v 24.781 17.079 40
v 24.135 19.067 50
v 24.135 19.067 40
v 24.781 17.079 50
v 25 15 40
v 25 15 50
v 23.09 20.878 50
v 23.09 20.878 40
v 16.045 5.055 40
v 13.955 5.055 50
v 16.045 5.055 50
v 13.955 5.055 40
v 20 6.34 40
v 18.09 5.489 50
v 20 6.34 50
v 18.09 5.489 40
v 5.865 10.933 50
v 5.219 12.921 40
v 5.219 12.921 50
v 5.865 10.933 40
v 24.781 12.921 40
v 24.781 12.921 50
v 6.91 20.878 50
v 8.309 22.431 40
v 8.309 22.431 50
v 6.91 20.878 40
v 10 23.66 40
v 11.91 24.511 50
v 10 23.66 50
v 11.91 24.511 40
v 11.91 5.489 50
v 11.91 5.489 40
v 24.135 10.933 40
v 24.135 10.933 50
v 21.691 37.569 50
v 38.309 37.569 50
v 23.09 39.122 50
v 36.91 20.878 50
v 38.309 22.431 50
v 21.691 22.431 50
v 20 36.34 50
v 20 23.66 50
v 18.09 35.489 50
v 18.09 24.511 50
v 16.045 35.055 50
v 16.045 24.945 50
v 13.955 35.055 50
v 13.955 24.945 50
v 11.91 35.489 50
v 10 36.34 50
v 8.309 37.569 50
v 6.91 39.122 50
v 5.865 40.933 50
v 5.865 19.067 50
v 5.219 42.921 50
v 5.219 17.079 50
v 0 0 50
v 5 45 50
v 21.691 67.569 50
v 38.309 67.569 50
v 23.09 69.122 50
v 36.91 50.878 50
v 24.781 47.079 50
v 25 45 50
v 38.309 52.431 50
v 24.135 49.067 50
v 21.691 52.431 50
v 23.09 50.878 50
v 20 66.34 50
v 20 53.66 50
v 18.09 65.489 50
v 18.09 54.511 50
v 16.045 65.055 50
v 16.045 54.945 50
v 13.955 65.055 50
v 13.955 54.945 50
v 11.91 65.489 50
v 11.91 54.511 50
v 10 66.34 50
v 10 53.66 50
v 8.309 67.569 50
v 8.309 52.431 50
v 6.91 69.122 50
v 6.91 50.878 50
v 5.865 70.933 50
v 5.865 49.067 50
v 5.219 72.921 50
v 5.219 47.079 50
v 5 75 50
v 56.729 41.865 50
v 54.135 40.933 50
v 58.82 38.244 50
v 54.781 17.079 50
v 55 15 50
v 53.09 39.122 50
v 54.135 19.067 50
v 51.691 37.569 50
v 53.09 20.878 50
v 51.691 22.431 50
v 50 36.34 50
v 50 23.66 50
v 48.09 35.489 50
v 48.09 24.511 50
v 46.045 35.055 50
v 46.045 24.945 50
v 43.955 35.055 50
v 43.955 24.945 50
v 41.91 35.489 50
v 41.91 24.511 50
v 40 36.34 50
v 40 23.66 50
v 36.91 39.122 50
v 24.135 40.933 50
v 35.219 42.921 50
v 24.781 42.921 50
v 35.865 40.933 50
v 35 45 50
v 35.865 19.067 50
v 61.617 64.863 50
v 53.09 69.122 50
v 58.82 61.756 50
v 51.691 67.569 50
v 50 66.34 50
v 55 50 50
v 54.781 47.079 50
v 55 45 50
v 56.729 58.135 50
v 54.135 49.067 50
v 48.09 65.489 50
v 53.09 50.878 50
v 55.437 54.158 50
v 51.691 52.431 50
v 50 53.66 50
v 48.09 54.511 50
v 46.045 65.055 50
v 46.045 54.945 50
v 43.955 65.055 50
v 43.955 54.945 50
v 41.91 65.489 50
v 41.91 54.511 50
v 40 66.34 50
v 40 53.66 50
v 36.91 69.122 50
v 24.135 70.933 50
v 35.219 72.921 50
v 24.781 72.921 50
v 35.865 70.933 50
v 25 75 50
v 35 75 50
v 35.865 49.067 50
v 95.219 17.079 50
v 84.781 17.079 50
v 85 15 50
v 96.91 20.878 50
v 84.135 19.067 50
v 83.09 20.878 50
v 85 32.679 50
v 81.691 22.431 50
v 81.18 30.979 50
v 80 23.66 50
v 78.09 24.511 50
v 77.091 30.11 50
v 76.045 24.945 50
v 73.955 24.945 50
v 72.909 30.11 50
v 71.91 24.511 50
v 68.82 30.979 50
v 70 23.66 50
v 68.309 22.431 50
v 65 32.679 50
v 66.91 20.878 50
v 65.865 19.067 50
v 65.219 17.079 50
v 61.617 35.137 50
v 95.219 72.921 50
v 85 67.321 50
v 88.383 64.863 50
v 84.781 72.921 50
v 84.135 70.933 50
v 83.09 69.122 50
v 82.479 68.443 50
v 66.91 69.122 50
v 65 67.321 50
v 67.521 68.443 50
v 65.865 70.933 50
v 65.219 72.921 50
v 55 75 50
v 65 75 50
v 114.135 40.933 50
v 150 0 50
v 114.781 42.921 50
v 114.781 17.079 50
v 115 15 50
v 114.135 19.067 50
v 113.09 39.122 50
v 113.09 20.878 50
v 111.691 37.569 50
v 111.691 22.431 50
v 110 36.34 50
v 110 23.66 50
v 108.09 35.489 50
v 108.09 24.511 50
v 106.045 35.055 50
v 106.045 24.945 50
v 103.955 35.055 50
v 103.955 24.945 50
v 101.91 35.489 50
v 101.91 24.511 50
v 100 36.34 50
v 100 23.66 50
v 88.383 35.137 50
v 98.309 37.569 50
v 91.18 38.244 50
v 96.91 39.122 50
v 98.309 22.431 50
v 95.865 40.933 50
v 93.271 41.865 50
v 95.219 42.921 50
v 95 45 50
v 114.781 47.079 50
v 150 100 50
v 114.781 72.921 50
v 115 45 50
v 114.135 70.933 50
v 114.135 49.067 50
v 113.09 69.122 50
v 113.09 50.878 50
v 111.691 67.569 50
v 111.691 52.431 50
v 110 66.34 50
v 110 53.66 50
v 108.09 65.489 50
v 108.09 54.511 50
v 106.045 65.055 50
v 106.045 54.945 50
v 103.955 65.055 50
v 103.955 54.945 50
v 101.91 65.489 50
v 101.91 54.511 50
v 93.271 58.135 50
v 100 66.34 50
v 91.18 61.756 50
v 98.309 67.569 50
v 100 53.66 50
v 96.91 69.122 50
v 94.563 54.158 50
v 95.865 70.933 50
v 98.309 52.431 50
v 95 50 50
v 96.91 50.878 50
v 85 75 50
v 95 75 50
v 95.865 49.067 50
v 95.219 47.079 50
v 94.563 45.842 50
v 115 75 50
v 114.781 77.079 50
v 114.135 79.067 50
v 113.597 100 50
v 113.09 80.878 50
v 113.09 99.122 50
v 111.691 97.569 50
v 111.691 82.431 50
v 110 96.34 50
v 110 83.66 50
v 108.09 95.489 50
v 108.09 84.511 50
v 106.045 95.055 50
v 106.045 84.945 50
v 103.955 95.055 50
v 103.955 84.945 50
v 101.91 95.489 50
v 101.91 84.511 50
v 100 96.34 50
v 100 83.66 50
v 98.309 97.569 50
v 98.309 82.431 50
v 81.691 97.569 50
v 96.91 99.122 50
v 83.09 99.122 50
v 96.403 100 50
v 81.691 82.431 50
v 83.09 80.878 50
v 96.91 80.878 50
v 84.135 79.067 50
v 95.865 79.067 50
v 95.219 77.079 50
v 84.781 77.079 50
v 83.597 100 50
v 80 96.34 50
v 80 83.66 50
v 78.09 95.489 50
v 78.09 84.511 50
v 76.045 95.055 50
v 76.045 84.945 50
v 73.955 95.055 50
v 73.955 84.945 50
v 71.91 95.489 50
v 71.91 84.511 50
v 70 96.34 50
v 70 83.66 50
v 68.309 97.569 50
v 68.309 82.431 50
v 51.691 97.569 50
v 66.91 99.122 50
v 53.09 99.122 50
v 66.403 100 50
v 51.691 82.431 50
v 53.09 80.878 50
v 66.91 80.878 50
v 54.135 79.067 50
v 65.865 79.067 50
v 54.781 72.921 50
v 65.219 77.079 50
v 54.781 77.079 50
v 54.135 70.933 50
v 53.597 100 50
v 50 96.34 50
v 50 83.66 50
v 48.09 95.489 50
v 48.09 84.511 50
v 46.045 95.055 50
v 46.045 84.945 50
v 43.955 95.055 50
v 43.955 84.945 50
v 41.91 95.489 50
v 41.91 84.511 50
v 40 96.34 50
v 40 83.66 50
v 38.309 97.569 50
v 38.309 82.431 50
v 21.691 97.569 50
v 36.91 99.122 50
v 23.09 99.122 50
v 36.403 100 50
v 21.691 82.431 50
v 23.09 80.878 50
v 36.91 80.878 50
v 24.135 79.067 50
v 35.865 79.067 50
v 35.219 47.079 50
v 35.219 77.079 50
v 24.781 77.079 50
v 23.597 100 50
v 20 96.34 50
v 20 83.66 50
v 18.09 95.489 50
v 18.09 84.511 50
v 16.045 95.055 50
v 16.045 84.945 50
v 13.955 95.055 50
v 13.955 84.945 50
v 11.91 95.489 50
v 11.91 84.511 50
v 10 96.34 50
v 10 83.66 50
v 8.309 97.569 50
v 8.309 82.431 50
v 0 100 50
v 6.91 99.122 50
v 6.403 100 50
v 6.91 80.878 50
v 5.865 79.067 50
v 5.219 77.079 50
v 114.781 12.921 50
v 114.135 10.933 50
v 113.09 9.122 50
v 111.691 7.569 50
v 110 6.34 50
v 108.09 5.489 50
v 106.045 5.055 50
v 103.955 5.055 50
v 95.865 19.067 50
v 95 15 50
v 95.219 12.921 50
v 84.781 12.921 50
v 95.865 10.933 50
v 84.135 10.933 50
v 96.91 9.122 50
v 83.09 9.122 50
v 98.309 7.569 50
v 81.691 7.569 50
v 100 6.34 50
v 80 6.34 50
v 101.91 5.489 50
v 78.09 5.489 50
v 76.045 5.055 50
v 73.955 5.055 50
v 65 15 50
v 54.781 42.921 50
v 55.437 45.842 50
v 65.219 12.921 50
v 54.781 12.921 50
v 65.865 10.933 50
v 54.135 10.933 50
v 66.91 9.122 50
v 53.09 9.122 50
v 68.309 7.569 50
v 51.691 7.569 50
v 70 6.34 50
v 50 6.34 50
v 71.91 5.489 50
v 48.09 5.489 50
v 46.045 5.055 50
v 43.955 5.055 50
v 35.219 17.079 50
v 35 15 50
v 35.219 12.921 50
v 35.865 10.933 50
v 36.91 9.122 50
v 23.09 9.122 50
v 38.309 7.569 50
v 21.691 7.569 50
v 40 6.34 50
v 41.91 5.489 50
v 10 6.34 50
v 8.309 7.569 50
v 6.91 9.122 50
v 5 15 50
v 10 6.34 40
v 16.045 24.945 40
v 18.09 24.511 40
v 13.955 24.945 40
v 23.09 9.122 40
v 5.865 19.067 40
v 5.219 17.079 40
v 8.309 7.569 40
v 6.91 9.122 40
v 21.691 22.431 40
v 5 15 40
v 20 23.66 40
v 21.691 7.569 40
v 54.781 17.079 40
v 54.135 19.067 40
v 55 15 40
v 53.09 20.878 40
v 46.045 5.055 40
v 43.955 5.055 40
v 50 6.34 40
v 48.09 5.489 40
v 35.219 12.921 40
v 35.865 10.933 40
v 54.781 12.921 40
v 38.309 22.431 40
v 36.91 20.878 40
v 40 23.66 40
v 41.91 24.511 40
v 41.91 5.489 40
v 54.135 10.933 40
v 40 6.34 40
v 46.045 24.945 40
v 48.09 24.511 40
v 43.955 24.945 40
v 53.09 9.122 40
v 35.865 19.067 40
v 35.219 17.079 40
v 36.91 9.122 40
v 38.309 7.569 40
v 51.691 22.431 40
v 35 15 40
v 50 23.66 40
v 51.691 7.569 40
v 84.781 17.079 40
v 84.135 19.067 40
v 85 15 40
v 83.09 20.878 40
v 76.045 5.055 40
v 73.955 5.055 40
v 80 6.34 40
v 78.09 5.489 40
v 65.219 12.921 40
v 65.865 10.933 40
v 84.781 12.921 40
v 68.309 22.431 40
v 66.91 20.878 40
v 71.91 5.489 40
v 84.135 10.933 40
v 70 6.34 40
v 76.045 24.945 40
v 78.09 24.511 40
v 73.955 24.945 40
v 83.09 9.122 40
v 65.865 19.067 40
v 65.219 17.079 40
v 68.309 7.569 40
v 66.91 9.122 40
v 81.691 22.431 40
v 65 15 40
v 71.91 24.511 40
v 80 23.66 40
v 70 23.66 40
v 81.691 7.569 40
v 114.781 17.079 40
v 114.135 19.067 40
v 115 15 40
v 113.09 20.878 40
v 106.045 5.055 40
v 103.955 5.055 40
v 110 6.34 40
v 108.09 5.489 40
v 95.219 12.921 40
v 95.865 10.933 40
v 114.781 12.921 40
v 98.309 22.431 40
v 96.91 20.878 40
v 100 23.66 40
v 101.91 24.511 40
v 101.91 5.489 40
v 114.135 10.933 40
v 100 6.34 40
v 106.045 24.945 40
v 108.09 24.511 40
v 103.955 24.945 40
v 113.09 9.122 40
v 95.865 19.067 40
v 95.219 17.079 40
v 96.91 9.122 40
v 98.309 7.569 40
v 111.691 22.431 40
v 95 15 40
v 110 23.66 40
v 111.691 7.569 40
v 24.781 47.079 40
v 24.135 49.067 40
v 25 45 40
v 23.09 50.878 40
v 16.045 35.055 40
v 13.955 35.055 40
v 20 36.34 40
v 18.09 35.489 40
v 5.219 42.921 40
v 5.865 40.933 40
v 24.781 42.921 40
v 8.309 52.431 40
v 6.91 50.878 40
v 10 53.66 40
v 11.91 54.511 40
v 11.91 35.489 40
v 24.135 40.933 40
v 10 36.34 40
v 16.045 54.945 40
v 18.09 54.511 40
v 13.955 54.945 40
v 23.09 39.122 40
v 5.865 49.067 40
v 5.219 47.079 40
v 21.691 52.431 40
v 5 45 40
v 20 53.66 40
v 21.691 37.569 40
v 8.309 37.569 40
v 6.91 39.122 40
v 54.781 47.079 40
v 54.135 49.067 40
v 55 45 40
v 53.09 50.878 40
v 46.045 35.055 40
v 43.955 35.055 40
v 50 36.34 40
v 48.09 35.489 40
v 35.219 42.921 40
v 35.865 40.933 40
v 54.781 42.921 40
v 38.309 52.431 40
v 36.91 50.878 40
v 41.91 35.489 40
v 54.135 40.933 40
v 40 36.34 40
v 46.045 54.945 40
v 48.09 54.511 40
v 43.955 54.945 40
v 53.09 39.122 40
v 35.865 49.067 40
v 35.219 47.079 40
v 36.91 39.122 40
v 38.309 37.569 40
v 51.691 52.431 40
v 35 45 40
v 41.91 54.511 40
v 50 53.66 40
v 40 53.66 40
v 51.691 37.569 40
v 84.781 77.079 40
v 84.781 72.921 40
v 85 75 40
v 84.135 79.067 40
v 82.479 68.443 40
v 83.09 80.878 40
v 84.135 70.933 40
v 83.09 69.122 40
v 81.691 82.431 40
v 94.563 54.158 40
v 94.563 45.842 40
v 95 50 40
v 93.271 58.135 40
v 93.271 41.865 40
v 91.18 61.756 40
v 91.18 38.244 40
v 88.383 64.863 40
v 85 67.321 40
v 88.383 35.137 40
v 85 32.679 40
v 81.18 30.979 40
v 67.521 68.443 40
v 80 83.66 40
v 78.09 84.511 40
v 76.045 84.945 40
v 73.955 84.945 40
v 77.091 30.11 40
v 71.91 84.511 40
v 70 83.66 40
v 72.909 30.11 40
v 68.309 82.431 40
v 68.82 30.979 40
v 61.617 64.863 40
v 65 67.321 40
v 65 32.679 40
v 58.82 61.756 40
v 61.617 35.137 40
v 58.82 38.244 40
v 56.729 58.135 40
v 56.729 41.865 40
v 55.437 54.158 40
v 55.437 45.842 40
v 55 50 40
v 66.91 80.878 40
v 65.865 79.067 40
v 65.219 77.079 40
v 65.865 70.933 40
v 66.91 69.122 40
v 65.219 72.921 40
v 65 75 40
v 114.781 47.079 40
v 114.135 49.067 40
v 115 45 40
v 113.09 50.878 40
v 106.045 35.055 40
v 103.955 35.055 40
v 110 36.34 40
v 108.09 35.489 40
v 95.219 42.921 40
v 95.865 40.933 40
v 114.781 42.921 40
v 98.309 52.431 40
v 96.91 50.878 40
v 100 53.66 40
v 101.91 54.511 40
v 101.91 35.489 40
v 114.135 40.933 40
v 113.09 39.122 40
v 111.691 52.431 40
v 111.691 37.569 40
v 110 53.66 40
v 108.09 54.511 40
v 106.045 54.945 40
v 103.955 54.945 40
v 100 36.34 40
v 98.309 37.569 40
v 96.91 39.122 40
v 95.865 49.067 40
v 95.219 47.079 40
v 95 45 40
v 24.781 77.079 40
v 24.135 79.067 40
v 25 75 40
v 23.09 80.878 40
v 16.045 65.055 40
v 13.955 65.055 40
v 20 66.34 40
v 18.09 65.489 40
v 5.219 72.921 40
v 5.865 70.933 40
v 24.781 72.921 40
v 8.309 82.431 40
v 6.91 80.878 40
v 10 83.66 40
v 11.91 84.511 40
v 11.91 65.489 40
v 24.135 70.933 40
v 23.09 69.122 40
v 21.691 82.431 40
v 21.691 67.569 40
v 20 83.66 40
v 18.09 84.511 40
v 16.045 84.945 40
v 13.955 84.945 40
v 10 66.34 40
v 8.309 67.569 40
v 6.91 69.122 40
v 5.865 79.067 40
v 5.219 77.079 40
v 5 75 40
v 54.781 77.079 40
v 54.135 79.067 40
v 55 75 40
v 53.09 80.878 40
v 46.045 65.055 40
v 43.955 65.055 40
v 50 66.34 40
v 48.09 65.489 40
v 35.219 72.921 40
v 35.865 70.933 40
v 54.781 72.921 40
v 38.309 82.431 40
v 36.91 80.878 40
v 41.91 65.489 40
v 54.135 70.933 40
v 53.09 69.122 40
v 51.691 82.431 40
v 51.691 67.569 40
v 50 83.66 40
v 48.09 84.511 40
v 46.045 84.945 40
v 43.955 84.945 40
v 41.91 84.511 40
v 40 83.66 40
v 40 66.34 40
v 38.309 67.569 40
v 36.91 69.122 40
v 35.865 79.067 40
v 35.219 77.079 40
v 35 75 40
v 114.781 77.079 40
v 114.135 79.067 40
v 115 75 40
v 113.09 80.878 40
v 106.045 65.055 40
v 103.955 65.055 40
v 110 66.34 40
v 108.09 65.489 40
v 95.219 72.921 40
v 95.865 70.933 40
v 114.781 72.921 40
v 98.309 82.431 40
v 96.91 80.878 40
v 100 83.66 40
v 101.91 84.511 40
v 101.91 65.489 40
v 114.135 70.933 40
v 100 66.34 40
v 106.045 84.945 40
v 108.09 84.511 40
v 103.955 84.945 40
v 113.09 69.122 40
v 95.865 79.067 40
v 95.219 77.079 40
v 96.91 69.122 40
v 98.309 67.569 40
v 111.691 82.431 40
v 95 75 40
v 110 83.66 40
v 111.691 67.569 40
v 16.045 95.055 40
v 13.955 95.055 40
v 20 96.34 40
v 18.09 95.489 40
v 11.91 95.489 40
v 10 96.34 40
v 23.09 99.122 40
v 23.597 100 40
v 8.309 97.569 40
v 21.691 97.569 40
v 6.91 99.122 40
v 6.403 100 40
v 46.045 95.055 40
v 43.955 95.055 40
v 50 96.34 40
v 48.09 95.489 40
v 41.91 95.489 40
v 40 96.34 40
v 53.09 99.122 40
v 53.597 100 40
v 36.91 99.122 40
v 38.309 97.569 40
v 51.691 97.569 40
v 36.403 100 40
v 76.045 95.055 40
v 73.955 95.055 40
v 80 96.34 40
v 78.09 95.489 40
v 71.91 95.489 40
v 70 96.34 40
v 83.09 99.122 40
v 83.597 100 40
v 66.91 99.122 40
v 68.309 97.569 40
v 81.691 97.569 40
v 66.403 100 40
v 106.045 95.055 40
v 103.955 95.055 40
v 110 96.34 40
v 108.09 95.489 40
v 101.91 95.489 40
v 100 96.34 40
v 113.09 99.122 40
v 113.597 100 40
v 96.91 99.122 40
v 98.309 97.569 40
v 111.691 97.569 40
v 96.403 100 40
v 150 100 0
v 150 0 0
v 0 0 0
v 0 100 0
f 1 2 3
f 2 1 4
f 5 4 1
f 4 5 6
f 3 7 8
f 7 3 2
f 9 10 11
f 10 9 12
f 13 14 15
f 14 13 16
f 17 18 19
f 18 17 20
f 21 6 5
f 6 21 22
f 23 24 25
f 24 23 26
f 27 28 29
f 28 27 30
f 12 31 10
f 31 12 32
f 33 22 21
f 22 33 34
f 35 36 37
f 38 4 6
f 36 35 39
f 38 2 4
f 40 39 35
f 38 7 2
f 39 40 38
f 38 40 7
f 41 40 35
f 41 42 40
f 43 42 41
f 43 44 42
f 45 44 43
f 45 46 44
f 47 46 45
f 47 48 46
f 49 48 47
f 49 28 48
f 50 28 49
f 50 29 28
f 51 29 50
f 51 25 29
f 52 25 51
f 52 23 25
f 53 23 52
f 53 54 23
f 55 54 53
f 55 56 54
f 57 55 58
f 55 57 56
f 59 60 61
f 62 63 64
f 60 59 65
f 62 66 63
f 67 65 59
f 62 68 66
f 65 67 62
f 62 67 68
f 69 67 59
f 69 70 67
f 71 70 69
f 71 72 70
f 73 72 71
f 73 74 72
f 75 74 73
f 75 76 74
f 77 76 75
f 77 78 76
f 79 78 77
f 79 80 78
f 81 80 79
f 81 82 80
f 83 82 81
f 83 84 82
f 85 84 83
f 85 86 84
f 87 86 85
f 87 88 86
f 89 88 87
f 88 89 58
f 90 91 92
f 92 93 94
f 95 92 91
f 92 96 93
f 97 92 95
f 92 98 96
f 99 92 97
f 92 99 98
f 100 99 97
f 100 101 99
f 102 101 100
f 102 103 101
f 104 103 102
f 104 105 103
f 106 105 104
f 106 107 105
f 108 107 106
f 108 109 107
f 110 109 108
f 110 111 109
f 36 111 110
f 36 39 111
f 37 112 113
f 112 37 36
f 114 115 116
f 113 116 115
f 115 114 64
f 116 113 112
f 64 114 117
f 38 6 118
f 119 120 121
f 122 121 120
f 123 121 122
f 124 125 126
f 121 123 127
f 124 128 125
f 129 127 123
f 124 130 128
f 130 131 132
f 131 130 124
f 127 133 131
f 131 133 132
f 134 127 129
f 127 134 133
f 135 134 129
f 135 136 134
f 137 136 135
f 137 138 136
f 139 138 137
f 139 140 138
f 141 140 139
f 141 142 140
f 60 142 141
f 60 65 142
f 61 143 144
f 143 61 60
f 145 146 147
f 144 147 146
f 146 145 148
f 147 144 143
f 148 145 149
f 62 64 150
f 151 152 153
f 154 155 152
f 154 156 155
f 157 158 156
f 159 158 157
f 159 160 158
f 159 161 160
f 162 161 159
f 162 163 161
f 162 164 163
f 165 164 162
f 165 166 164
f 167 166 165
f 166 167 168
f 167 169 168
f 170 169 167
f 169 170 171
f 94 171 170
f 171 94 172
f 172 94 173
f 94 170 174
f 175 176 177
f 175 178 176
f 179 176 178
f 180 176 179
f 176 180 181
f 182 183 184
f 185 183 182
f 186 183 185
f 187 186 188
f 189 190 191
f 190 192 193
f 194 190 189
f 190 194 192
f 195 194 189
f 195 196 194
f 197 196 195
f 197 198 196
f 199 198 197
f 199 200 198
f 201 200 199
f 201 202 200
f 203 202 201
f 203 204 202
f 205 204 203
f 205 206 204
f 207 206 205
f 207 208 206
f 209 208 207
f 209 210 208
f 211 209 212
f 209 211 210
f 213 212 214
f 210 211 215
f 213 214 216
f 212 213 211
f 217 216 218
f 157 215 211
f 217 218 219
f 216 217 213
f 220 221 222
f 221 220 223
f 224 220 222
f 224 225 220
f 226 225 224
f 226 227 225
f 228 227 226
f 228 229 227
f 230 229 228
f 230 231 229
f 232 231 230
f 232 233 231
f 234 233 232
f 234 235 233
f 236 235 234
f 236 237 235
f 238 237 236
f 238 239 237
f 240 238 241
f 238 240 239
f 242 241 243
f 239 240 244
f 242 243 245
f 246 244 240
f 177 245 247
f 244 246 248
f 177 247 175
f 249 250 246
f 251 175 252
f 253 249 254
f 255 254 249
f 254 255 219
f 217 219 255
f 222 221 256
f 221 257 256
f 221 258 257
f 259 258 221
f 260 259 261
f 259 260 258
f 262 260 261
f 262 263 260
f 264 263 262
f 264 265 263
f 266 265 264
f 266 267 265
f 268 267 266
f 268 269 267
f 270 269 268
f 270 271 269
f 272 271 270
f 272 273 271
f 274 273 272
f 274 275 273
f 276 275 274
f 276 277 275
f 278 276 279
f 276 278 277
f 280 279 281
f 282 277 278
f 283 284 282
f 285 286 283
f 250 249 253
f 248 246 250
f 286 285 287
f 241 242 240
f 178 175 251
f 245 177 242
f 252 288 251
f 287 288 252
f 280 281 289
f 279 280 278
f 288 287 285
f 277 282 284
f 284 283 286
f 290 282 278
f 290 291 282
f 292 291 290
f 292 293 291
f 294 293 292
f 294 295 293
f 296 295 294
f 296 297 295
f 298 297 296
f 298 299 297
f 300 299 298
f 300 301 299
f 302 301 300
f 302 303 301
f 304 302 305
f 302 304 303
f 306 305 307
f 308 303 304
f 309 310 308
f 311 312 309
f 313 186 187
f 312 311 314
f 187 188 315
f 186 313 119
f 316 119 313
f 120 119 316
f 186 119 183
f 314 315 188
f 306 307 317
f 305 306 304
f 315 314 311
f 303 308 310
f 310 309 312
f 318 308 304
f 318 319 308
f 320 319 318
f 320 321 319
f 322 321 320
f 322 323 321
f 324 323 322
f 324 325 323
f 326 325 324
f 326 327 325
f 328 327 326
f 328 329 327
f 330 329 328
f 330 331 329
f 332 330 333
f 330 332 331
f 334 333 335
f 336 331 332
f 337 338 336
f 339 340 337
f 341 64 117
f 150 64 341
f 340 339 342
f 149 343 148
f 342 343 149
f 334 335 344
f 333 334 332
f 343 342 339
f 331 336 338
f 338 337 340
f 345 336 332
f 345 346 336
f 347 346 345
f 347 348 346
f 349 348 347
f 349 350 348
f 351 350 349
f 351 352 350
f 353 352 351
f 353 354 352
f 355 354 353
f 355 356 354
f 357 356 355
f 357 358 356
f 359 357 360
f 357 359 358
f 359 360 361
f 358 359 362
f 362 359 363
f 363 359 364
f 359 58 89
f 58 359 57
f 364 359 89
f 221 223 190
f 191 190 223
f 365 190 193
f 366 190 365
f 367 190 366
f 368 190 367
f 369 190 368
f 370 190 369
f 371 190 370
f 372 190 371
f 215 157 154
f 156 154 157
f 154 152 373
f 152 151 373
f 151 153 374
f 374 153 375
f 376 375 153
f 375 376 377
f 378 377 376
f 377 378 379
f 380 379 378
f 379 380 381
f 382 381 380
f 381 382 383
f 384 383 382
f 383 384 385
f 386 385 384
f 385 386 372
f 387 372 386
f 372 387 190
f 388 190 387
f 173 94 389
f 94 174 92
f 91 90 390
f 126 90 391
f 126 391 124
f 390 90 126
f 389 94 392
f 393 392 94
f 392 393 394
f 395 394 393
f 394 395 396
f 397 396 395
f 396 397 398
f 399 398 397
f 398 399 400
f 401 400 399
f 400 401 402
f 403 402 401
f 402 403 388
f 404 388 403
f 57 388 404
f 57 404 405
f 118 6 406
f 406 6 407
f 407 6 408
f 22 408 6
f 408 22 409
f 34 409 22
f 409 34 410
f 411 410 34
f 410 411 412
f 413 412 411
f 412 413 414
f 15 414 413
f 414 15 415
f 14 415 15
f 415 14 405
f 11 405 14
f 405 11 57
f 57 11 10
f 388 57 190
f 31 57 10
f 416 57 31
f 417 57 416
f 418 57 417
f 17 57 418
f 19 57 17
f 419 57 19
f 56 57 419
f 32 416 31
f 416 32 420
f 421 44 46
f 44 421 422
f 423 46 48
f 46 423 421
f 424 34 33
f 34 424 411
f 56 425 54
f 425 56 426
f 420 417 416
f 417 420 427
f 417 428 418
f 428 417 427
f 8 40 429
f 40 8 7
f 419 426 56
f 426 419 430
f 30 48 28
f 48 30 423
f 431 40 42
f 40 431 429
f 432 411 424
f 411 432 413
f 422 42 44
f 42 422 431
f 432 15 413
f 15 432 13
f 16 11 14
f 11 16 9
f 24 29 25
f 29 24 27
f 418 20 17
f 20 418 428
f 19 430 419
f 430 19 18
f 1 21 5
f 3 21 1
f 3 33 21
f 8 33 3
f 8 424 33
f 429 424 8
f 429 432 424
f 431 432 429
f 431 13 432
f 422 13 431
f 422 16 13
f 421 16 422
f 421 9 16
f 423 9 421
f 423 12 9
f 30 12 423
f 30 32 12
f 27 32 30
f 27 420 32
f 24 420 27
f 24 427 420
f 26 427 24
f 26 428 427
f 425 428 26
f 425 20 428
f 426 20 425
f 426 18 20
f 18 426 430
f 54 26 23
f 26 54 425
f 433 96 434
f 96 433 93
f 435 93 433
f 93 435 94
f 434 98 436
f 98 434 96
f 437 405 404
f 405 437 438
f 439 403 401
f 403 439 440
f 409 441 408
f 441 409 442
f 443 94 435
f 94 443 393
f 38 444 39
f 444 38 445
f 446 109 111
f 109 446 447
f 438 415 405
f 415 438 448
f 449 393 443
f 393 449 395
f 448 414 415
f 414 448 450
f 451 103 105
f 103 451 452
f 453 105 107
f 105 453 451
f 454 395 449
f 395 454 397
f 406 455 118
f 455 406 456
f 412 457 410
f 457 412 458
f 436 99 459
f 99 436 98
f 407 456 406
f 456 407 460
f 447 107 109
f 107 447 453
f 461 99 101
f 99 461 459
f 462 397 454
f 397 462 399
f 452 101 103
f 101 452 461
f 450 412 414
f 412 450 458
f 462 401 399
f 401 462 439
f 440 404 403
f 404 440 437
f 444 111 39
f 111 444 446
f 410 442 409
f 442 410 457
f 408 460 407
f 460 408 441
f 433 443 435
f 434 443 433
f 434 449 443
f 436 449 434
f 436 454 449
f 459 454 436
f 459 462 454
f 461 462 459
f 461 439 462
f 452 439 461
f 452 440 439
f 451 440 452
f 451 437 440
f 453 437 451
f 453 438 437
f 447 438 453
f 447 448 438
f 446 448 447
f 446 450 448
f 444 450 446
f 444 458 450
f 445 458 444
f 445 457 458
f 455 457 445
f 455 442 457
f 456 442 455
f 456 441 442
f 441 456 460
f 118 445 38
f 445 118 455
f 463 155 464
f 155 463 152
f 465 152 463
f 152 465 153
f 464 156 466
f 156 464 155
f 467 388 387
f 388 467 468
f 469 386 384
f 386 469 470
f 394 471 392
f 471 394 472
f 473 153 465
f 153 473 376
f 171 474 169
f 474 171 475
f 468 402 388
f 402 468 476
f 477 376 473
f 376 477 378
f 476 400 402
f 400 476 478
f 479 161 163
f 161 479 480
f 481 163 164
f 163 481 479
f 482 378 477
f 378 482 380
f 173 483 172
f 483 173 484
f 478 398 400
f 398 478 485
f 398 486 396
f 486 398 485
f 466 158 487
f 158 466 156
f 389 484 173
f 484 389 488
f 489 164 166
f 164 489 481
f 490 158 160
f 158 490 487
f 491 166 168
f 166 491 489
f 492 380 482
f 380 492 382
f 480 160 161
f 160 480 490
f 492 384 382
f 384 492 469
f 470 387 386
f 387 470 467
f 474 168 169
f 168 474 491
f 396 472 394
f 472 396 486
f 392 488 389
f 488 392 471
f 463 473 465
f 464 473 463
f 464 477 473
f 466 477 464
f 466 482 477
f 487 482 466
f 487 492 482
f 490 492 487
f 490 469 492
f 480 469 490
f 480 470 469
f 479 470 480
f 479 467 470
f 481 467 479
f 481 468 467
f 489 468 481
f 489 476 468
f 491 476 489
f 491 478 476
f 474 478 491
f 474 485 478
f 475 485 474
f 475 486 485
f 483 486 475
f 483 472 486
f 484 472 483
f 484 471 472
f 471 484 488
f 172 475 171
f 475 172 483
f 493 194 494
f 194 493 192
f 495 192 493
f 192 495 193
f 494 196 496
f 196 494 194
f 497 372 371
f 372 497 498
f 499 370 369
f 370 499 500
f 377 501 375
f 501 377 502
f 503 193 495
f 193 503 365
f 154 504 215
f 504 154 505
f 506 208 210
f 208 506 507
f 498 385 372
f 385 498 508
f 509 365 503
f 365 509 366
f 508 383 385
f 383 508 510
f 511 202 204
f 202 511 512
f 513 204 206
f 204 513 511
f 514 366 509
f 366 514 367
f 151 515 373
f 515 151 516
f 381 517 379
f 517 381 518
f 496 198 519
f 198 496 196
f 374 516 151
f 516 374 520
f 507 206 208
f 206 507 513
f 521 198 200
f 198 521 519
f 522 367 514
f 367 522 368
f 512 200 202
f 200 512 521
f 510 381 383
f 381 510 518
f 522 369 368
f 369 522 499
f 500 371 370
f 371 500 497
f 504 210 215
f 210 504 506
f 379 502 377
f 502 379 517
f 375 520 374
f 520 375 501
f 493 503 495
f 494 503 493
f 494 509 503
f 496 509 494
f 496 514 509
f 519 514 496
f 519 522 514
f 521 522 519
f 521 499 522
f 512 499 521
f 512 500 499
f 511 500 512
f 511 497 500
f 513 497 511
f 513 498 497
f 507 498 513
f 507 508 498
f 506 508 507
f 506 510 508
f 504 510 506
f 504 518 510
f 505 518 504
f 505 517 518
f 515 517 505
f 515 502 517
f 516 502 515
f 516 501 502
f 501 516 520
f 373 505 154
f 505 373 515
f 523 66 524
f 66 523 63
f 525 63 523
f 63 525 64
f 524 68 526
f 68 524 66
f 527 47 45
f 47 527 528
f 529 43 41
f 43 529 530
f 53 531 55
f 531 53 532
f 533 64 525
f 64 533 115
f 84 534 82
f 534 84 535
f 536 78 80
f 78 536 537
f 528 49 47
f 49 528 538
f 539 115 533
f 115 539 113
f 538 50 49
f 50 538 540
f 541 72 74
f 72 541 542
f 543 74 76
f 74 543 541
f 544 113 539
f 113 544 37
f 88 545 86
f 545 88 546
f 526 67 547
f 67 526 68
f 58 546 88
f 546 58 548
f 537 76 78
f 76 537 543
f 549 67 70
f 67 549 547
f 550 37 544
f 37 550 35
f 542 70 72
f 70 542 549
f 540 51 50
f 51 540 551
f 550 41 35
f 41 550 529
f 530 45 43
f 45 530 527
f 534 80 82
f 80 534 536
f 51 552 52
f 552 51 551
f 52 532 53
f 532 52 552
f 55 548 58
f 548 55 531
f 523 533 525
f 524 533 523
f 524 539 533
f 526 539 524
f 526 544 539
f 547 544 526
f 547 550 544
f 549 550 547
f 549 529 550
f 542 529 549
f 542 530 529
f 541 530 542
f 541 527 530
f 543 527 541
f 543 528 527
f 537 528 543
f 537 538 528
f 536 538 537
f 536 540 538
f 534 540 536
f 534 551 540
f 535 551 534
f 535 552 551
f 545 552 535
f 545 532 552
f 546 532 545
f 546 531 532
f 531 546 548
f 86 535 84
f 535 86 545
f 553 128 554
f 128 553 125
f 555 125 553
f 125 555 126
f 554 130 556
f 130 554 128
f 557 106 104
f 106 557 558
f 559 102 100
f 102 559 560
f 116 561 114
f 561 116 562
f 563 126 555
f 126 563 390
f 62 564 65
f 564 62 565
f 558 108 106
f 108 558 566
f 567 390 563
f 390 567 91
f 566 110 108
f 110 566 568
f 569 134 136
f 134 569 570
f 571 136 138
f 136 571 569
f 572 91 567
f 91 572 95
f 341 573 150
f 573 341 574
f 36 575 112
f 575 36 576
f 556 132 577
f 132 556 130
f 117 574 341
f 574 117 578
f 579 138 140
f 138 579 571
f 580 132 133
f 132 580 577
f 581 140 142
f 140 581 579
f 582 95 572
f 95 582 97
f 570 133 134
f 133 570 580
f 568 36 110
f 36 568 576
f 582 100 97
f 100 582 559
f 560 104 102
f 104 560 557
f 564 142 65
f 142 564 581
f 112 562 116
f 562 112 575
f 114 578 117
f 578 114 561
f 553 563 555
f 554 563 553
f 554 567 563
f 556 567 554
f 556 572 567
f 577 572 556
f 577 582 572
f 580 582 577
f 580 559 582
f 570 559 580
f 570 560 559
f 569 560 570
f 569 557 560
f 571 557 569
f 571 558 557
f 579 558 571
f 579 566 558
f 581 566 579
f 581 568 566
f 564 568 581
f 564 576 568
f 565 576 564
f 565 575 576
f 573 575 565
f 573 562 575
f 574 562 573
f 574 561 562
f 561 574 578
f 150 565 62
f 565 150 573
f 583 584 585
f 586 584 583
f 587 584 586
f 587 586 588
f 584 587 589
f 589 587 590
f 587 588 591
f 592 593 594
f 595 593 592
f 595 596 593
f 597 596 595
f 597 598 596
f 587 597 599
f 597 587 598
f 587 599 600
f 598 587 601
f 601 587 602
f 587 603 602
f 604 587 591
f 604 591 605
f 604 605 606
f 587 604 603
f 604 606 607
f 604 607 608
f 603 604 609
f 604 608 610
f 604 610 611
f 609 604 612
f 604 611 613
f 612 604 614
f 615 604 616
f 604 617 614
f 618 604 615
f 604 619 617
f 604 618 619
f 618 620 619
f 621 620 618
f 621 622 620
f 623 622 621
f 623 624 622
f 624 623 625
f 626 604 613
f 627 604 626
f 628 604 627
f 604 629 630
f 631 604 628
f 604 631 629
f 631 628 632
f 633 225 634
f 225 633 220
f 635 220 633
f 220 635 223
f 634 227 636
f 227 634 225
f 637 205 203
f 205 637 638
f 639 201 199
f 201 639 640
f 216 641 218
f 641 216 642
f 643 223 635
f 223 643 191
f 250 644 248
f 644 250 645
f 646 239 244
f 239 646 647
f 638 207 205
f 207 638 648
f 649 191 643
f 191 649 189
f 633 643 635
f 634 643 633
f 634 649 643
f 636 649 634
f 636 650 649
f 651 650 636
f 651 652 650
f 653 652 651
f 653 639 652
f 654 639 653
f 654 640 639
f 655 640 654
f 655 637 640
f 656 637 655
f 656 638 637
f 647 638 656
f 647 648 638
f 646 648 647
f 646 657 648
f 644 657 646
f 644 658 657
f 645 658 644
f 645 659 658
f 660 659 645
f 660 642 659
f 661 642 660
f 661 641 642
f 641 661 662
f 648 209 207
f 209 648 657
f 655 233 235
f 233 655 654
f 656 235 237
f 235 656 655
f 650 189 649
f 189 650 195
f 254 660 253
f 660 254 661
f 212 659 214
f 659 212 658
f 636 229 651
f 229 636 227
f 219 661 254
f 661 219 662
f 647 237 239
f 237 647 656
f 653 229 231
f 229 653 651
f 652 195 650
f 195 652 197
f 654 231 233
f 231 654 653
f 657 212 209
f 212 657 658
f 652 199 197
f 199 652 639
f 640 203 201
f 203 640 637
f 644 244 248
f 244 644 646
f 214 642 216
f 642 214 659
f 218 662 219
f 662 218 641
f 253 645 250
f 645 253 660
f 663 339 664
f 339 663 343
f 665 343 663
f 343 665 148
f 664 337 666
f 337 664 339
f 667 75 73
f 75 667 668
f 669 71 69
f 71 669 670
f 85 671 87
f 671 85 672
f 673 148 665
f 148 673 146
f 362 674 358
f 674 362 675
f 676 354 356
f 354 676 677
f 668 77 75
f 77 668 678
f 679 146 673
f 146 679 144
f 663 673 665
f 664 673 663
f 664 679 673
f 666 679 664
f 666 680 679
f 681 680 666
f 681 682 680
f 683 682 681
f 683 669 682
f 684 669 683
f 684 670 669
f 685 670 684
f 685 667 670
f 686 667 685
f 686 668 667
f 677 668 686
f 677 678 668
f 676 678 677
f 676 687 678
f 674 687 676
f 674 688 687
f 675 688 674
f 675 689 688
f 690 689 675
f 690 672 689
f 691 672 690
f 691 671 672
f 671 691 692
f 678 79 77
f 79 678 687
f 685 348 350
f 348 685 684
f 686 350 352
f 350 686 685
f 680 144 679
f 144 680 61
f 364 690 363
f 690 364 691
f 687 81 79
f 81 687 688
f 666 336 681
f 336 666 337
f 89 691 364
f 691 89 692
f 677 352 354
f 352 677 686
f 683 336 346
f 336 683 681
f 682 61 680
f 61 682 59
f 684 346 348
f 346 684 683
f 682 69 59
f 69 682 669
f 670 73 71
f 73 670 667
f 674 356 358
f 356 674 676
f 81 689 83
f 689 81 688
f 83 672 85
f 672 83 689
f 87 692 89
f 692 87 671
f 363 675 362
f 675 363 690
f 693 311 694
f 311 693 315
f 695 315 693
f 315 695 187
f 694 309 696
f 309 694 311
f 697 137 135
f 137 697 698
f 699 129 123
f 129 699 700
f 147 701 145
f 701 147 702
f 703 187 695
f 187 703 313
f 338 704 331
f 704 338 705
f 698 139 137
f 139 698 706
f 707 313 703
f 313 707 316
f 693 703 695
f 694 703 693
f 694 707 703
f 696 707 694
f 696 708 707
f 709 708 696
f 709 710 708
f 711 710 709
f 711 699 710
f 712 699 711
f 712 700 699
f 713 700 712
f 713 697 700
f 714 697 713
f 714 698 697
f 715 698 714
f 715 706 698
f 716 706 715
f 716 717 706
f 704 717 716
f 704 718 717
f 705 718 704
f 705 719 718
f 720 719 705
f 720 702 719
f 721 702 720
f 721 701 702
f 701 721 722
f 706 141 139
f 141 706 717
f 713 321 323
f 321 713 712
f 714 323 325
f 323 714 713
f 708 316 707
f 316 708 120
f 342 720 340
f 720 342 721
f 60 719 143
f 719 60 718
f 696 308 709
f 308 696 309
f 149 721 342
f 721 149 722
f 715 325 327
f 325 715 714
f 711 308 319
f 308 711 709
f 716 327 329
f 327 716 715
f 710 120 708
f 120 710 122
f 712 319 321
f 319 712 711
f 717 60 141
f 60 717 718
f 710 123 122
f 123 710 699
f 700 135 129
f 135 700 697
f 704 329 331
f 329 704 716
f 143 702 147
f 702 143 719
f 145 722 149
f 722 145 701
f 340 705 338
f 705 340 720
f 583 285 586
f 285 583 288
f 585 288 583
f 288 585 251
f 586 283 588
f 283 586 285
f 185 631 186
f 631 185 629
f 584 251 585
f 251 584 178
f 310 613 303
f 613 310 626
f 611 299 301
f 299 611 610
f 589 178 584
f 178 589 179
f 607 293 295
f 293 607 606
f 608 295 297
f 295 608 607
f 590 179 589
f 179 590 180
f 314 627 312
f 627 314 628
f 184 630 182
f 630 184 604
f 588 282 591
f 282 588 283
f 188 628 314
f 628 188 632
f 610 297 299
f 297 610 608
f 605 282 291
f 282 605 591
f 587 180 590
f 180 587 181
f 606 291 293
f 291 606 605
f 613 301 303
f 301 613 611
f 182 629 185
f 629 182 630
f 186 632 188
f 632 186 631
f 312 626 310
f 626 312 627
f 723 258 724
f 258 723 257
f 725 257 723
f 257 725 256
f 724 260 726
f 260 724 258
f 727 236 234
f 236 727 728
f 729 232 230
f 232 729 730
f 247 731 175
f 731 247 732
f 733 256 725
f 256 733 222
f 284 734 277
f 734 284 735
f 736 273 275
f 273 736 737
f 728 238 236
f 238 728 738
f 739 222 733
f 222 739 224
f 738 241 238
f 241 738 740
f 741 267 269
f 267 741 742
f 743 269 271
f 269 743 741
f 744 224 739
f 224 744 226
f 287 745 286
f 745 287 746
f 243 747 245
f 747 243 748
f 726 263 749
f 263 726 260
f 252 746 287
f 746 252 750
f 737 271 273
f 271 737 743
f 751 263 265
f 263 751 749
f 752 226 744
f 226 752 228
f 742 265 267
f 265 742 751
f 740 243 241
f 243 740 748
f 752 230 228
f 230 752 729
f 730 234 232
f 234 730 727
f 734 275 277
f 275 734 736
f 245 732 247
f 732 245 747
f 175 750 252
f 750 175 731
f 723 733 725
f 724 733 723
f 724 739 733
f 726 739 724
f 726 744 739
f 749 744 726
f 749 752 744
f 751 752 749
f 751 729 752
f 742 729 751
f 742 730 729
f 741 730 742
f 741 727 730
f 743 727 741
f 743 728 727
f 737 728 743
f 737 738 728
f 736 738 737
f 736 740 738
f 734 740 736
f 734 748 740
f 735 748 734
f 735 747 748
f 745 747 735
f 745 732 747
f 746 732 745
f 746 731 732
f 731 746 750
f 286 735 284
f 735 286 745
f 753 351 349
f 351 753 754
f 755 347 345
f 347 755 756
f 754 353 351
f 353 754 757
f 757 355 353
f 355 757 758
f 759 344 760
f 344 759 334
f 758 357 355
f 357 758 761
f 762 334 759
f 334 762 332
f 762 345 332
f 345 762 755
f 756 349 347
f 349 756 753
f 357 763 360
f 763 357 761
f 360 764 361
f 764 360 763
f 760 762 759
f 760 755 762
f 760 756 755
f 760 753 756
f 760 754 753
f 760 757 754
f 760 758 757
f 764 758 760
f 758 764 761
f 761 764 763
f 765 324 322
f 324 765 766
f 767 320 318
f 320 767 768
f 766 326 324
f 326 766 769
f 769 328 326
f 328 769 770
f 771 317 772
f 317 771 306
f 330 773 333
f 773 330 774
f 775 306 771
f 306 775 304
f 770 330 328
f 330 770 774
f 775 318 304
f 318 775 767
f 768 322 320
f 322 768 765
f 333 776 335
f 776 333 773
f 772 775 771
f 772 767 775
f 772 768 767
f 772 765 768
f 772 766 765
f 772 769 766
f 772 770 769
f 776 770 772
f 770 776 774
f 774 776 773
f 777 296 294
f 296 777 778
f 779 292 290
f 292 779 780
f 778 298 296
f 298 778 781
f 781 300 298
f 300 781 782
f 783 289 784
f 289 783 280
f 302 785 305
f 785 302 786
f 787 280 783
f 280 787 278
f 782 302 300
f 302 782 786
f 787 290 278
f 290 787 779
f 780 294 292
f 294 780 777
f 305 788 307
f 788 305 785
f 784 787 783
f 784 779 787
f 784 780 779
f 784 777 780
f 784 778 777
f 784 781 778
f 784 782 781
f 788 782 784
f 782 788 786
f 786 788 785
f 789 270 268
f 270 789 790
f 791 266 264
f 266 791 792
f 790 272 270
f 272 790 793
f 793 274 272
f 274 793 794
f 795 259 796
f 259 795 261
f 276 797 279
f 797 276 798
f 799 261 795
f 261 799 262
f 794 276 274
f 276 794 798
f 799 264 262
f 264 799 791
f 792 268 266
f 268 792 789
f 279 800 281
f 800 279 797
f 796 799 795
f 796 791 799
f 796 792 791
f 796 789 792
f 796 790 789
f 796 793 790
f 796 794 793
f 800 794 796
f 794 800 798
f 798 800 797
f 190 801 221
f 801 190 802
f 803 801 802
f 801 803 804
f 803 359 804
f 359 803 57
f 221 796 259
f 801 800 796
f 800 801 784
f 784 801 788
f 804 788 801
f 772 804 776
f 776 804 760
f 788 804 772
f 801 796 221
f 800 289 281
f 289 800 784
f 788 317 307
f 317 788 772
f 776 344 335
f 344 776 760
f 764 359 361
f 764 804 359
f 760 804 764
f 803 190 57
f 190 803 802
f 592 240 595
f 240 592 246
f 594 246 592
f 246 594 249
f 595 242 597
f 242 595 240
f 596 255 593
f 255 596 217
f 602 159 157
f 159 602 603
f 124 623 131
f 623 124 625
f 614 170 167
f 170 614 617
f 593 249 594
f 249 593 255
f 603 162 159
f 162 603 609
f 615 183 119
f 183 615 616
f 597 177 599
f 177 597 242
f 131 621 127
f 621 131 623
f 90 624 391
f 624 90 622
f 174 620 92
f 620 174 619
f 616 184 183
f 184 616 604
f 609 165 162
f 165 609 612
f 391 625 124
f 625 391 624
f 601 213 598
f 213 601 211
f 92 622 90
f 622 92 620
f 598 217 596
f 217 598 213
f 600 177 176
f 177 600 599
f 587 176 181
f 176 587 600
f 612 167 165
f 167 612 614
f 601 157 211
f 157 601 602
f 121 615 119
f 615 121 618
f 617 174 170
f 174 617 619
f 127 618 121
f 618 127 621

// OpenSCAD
// file: Untitled-1.scad
// Tube Rack with Parameters

// Parameters
module tube_rack(
    base_length = 150,   // Length of the rack
    base_width = 100,    // Width of the rack
    base_height = 50,    // Height of the rack
    hole_diameter = 20,  // Diameter of the tube holes
    hole_depth = 10,     // Depth of the tube holes
    rows = 4,            // Number of rows of holes
    columns = 4,         // Number of columns of holes
    row_spacing = 30,    // Spacing between rows
    column_spacing = 30, // Spacing between columns
    center_hole = true,  // Checkbox for center hole
    center_hole_diameter = 40 // Diameter of the center hole
) {
    // Base
    difference() {
        // Base block
        cube([base_length, base_width, base_height], center = false);

        // Holes for tubes
        for (row = [0:rows - 1]) {
            for (col = [0:columns - 1]) {
                translate([
                    (col + 0.5) * column_spacing,
                    (row + 0.5) * row_spacing,
                    base_height - hole_depth
                ])
                cylinder(h = hole_depth, d = hole_diameter, center = false);
            }
        }

        // Optional center hole
        if (center_hole) {
            translate([base_length / 2, base_width / 2, base_height - hole_depth])
                cylinder(h = base_height, d = center_hole_diameter, center = false);
        }
    }
}

// Call the tube_rack module
tube_rack(
    base_length = 150,
    base_width = 100,
    base_height = 50,
    hole_diameter = 20,
    hole_depth = 10,
    rows = 4,
    columns = 4,
    row_spacing = 30,
    column_spacing = 30,
    center_hole = true,
    center_hole_diameter = 40
);
// main file
// Standard entry point for this project
include <Untitled-1.scad>
